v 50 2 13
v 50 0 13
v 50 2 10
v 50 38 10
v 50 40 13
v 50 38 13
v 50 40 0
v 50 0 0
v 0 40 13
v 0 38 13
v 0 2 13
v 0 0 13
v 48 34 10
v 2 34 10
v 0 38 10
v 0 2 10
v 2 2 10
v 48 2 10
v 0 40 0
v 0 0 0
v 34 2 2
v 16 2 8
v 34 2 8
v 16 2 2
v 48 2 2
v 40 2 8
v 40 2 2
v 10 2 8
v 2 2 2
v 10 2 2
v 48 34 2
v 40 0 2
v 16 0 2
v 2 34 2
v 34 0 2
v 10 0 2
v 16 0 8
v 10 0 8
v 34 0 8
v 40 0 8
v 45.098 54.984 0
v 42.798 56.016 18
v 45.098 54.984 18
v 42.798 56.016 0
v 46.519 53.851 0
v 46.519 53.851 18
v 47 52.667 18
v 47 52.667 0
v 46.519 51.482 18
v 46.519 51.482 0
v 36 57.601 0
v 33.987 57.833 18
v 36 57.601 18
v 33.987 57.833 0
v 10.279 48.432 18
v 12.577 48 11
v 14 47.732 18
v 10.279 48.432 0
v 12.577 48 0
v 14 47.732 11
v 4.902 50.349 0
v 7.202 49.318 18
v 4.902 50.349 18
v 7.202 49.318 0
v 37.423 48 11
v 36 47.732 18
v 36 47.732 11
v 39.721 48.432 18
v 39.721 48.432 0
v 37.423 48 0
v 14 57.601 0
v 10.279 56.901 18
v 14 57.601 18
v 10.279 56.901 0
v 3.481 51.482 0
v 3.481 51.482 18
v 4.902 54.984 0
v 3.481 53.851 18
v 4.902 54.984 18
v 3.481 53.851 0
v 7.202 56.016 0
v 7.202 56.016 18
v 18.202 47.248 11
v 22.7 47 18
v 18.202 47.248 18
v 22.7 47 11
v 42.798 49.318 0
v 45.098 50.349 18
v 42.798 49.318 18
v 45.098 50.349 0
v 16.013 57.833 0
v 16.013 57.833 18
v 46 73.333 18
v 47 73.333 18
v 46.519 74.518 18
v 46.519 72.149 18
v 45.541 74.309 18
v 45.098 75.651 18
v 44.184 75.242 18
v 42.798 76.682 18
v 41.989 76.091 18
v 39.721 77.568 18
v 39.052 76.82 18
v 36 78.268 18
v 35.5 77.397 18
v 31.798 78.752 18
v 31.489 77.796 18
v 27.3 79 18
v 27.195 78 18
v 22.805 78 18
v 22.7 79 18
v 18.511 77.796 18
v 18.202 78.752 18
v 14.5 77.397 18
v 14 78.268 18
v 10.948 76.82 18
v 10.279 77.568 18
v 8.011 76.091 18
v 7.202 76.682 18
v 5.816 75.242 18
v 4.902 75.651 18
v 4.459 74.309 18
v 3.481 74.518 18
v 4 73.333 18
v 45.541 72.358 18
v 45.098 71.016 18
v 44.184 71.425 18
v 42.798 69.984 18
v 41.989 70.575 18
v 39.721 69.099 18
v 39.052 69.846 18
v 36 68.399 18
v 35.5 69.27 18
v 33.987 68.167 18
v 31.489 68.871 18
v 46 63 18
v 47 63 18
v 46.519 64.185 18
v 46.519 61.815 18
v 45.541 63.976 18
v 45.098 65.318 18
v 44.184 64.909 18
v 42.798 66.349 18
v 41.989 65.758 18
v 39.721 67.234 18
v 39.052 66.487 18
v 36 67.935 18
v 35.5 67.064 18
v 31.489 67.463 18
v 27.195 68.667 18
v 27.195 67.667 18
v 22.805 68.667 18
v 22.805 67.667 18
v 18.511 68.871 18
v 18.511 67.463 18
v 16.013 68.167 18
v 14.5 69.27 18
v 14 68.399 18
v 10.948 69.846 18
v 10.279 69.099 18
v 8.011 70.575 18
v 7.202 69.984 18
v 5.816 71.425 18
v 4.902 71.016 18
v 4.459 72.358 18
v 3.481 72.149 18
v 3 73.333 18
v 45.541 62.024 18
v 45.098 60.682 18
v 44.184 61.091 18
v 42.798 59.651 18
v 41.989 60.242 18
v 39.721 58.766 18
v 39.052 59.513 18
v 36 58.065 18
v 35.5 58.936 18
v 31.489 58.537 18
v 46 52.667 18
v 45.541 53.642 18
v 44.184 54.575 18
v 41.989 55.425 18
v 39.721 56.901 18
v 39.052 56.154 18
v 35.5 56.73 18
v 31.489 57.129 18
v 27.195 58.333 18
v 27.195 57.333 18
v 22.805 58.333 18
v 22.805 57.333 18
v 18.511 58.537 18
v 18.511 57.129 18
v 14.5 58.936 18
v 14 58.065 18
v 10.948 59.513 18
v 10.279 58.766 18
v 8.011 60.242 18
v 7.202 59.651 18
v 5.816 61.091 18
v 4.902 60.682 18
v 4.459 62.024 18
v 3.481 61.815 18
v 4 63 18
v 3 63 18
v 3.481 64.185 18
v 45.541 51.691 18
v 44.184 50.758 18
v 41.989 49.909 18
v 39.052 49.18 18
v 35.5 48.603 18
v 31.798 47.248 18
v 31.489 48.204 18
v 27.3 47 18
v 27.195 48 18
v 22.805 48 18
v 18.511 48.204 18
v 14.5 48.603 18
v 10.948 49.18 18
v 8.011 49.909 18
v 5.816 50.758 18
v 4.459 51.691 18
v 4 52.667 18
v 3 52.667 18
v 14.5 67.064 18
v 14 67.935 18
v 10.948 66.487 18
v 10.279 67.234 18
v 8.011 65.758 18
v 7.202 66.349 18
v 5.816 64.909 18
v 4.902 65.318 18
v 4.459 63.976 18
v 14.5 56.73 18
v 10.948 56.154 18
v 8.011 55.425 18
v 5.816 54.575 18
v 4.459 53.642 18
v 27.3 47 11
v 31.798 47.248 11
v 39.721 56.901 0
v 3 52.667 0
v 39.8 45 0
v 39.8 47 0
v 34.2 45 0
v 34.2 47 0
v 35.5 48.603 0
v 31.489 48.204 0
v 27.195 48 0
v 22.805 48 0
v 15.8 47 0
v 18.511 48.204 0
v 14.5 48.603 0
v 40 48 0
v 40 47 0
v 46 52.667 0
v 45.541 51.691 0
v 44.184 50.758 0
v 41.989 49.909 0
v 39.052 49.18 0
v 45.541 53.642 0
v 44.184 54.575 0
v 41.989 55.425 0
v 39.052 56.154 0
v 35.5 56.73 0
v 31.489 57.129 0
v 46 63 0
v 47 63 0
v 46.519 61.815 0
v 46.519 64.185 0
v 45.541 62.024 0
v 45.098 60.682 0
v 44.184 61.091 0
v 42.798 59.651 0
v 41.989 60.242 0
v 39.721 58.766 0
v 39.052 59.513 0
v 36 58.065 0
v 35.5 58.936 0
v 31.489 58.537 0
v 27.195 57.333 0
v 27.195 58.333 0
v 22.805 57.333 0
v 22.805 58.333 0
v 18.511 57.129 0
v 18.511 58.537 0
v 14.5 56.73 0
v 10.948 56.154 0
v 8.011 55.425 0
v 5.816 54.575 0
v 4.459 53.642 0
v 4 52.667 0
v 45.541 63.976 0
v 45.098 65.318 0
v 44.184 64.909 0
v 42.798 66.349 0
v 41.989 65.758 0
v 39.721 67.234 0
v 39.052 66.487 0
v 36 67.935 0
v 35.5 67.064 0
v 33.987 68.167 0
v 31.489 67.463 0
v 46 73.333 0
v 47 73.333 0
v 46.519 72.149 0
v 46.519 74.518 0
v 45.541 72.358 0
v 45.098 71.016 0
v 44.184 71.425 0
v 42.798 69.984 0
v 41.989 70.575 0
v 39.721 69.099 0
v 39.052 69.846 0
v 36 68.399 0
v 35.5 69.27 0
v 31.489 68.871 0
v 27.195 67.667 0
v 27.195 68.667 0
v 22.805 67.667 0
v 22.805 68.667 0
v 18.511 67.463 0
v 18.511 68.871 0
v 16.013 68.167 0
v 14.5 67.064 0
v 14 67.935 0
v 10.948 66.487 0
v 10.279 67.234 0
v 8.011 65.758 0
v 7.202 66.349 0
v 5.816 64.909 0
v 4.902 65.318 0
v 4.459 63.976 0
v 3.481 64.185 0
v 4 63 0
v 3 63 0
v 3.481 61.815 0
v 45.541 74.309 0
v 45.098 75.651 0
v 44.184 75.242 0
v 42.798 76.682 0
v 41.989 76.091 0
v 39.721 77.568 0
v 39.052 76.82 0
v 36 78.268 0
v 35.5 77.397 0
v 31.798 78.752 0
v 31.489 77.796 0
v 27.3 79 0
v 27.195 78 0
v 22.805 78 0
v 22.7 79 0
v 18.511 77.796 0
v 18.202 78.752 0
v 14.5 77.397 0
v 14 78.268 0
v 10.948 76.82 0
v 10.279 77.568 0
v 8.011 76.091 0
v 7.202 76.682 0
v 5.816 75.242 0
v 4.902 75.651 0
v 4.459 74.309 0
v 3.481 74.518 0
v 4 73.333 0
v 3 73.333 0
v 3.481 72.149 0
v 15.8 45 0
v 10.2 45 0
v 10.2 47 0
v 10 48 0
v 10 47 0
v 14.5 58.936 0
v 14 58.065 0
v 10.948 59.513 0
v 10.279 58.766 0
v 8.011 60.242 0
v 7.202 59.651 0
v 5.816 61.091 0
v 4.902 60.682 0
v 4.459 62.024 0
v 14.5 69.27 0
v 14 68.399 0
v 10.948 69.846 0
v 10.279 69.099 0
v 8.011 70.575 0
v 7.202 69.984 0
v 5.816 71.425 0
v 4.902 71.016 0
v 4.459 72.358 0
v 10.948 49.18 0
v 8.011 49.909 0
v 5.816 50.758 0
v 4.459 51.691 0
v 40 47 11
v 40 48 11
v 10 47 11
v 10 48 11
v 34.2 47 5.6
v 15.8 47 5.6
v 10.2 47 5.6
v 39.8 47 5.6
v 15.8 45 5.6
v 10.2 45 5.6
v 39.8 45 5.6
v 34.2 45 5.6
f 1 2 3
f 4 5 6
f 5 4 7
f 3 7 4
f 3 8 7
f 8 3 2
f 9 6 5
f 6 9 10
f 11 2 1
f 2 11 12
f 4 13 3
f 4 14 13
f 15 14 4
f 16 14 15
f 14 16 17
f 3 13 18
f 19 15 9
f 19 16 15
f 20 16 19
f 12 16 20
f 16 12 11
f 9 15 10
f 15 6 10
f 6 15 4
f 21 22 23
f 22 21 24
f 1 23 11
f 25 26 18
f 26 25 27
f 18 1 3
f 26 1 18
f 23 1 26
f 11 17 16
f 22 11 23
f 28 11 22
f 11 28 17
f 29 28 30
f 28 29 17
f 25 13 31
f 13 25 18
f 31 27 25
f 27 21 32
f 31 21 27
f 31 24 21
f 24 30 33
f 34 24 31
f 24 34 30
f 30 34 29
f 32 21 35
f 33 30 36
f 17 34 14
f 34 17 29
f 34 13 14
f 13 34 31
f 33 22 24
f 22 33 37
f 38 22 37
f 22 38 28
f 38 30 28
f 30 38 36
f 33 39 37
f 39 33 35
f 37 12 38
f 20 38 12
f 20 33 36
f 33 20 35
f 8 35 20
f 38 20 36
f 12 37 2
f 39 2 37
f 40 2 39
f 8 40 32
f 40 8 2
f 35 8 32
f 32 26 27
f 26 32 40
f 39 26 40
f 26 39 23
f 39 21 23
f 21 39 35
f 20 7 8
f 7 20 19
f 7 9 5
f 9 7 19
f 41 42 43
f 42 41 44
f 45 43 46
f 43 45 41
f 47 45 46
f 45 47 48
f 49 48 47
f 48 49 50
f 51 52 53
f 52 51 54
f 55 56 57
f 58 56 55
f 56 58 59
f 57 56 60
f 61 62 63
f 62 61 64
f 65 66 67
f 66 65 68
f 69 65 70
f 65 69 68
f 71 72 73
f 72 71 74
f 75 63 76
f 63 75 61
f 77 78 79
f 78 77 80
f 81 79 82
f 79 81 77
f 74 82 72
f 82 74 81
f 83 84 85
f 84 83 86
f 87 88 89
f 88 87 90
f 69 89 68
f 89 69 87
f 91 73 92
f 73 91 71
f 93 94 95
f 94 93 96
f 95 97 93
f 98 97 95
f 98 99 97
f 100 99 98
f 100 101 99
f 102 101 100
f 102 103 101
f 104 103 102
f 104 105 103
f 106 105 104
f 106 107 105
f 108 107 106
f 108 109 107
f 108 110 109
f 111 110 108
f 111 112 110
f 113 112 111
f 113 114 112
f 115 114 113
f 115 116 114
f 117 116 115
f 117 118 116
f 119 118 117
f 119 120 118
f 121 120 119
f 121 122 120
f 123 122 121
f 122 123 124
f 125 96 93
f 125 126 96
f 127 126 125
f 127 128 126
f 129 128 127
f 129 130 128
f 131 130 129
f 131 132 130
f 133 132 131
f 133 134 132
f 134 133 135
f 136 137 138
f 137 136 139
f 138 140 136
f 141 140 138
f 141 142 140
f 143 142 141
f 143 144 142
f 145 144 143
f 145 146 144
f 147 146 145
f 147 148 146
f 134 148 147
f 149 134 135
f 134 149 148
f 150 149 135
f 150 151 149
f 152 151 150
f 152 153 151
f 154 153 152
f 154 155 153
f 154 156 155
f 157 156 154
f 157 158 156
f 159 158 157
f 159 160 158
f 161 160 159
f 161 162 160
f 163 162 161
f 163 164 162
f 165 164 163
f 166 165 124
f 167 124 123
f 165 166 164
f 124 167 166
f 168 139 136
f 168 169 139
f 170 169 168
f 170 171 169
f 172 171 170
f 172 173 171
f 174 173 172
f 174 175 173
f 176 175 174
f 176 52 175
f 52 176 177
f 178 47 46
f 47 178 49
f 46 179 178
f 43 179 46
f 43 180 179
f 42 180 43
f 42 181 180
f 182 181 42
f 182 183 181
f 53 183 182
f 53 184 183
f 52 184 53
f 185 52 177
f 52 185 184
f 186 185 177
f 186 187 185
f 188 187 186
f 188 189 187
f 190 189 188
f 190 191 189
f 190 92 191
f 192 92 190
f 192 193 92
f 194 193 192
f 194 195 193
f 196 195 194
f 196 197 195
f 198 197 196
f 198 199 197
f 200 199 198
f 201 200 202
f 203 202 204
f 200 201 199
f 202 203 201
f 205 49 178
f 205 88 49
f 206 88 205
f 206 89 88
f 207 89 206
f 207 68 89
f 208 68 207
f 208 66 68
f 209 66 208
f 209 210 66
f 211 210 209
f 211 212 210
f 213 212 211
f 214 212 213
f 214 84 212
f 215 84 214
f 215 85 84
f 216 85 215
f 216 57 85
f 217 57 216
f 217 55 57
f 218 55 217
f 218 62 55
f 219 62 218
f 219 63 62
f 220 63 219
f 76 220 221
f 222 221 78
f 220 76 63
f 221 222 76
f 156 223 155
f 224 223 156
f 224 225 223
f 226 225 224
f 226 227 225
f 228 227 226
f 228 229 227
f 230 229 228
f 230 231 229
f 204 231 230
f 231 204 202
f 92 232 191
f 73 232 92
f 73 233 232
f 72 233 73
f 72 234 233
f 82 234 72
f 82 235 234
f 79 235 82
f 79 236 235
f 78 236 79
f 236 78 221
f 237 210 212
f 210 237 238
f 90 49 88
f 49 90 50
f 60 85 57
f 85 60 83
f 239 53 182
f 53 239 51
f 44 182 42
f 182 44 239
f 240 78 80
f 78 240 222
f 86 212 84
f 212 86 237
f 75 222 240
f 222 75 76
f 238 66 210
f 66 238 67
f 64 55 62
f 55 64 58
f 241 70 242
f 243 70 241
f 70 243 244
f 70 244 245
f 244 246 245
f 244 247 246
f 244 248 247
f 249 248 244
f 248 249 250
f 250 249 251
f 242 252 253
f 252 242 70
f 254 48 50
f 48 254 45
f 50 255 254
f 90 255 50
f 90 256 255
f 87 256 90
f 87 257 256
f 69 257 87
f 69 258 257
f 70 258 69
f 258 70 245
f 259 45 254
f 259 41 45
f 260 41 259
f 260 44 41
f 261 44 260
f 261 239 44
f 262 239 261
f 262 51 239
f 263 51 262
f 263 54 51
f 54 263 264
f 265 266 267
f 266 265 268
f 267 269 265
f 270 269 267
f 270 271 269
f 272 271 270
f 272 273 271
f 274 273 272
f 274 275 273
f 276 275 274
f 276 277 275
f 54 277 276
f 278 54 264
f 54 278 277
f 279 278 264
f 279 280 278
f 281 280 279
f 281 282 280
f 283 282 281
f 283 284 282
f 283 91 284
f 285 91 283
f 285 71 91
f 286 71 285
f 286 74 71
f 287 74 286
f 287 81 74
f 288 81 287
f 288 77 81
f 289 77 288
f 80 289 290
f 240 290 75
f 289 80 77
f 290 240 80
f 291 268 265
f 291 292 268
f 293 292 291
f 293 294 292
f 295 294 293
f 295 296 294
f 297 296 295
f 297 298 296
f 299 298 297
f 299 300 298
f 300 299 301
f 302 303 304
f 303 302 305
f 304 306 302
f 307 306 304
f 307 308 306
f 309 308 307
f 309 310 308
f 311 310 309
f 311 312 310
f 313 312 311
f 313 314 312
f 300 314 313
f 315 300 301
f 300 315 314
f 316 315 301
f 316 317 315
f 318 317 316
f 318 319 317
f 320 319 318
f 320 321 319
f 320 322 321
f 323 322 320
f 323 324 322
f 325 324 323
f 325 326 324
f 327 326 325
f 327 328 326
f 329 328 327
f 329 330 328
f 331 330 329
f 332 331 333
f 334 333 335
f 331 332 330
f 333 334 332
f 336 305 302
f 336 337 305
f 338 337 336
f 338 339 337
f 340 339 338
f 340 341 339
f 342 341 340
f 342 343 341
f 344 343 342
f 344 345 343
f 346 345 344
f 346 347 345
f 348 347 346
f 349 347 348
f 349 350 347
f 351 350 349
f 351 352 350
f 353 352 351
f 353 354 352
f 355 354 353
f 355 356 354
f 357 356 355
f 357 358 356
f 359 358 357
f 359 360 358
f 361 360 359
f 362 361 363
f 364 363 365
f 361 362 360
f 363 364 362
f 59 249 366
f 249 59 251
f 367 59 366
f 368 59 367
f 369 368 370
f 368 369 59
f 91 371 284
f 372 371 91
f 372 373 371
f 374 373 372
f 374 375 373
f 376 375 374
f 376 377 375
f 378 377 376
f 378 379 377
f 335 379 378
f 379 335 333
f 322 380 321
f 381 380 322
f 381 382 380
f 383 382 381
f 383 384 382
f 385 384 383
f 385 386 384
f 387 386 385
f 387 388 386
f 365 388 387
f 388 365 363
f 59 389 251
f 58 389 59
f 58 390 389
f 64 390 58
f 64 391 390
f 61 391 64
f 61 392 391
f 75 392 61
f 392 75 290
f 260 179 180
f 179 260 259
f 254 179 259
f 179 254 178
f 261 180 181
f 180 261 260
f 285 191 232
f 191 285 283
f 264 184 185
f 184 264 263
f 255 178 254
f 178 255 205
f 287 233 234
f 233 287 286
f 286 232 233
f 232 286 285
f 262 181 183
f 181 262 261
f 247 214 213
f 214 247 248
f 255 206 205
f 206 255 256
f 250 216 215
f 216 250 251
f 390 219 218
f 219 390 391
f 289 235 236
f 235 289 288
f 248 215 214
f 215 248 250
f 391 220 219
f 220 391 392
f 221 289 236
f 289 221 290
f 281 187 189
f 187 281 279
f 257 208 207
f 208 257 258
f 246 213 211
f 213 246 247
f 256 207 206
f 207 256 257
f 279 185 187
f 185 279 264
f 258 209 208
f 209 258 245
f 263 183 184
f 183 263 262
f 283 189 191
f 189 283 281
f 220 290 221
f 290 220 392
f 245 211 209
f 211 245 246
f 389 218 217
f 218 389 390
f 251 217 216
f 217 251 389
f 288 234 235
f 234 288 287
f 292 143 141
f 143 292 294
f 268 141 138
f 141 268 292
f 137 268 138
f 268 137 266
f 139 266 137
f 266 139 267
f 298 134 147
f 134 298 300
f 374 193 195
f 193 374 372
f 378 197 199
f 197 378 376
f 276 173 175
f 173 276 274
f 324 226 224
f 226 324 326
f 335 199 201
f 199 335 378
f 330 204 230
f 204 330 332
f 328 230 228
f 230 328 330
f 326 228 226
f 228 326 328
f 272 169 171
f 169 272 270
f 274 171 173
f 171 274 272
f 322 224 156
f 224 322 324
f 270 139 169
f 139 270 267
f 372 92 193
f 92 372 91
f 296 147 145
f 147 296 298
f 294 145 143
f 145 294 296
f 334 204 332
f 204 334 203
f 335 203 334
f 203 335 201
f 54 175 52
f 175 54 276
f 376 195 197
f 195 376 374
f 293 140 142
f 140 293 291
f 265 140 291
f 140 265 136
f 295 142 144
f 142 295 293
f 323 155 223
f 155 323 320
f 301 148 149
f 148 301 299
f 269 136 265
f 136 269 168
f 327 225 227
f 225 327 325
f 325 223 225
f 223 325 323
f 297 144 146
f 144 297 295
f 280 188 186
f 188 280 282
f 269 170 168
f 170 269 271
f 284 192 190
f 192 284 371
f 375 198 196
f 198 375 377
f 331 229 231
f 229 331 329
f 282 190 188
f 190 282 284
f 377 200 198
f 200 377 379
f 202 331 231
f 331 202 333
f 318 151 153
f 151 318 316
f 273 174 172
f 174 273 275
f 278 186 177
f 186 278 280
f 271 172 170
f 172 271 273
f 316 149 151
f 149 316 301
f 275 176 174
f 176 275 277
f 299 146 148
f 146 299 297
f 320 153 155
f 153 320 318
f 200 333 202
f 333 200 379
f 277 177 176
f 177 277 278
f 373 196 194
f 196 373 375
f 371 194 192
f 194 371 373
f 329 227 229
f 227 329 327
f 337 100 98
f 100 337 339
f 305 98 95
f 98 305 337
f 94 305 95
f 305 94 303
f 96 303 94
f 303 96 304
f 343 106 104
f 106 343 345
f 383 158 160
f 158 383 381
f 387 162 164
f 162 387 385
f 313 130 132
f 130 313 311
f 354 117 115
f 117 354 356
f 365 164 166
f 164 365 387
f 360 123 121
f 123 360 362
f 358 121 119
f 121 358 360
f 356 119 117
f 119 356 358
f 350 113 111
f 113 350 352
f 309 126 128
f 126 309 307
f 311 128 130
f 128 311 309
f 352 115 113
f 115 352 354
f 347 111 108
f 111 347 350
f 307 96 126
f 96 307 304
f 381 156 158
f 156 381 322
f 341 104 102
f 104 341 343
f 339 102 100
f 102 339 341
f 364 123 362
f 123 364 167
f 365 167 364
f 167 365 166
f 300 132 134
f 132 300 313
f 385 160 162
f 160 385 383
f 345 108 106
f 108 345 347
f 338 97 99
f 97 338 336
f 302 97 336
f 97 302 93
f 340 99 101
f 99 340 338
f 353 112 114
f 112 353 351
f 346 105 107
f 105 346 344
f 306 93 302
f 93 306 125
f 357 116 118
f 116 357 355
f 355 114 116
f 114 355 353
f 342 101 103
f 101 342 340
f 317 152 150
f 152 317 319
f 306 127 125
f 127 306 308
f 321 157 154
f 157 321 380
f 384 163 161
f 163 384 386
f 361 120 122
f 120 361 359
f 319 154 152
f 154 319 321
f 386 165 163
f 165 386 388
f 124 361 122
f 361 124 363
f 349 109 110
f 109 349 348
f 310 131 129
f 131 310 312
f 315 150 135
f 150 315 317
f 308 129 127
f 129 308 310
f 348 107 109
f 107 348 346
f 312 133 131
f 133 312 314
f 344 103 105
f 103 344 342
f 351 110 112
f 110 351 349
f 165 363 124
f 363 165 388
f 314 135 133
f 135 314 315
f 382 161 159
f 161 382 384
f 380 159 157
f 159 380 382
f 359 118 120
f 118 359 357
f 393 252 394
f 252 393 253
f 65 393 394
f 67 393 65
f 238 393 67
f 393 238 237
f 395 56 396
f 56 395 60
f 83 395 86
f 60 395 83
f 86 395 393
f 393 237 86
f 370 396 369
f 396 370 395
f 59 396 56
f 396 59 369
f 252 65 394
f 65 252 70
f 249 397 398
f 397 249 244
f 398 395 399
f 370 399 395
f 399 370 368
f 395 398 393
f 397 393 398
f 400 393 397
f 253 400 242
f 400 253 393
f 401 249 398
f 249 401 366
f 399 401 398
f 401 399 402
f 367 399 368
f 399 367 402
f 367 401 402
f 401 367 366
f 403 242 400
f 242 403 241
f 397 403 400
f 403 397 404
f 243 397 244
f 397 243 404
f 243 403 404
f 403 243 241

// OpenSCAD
hoehe=40;
breite=50;
auflage=10;

overlap=3;
luecke=4;

staerke=2;

federbreite=10;
federstaerke=1;

hohl=hoehe-2*staerke-luecke-federstaerke;

federanzahl=round(hohl/federbreite);
exaktfederbreite=hohl/federanzahl+federstaerke;

module add() {
    cube([breite,hoehe,auflage+overlap]);
    
}

module sub() {
    translate([0,staerke,auflage]) cube([breite,hoehe-2*staerke,overlap]);
    translate([staerke,staerke,staerke]) cube([breite-2*staerke,hoehe-2*staerke-luecke,auflage]);
    translate([10,0,staerke]) cube([6,staerke,6]);
    translate([breite-10-6,0,staerke]) cube([6,staerke,6]);

}

difference() {
    add();
    sub();
}

translate([0,hoehe+5,0]) {
    for(i=[0:federanzahl-1]) translate([breite/2,(exaktfederbreite-federstaerke)*i+staerke+exaktfederbreite/2,0]) difference() { 
    resize([0,exaktfederbreite,0]) cylinder(d=breite-3*staerke,h=auflage+overlap+5);
    resize([0,exaktfederbreite-2*federstaerke,0]) cylinder(d=breite-3*staerke-2*federstaerke,h=auflage+overlap+5);
}
        
    translate([10,staerke,0]) cube([breite-20,federstaerke,auflage+overlap-staerke]);
    translate([10+.2,0,0]) cube([6-.4,staerke,6-.4]);
    translate([breite-10-6+.2,0,0]) cube([6-.4,staerke,6-.4]);

}
